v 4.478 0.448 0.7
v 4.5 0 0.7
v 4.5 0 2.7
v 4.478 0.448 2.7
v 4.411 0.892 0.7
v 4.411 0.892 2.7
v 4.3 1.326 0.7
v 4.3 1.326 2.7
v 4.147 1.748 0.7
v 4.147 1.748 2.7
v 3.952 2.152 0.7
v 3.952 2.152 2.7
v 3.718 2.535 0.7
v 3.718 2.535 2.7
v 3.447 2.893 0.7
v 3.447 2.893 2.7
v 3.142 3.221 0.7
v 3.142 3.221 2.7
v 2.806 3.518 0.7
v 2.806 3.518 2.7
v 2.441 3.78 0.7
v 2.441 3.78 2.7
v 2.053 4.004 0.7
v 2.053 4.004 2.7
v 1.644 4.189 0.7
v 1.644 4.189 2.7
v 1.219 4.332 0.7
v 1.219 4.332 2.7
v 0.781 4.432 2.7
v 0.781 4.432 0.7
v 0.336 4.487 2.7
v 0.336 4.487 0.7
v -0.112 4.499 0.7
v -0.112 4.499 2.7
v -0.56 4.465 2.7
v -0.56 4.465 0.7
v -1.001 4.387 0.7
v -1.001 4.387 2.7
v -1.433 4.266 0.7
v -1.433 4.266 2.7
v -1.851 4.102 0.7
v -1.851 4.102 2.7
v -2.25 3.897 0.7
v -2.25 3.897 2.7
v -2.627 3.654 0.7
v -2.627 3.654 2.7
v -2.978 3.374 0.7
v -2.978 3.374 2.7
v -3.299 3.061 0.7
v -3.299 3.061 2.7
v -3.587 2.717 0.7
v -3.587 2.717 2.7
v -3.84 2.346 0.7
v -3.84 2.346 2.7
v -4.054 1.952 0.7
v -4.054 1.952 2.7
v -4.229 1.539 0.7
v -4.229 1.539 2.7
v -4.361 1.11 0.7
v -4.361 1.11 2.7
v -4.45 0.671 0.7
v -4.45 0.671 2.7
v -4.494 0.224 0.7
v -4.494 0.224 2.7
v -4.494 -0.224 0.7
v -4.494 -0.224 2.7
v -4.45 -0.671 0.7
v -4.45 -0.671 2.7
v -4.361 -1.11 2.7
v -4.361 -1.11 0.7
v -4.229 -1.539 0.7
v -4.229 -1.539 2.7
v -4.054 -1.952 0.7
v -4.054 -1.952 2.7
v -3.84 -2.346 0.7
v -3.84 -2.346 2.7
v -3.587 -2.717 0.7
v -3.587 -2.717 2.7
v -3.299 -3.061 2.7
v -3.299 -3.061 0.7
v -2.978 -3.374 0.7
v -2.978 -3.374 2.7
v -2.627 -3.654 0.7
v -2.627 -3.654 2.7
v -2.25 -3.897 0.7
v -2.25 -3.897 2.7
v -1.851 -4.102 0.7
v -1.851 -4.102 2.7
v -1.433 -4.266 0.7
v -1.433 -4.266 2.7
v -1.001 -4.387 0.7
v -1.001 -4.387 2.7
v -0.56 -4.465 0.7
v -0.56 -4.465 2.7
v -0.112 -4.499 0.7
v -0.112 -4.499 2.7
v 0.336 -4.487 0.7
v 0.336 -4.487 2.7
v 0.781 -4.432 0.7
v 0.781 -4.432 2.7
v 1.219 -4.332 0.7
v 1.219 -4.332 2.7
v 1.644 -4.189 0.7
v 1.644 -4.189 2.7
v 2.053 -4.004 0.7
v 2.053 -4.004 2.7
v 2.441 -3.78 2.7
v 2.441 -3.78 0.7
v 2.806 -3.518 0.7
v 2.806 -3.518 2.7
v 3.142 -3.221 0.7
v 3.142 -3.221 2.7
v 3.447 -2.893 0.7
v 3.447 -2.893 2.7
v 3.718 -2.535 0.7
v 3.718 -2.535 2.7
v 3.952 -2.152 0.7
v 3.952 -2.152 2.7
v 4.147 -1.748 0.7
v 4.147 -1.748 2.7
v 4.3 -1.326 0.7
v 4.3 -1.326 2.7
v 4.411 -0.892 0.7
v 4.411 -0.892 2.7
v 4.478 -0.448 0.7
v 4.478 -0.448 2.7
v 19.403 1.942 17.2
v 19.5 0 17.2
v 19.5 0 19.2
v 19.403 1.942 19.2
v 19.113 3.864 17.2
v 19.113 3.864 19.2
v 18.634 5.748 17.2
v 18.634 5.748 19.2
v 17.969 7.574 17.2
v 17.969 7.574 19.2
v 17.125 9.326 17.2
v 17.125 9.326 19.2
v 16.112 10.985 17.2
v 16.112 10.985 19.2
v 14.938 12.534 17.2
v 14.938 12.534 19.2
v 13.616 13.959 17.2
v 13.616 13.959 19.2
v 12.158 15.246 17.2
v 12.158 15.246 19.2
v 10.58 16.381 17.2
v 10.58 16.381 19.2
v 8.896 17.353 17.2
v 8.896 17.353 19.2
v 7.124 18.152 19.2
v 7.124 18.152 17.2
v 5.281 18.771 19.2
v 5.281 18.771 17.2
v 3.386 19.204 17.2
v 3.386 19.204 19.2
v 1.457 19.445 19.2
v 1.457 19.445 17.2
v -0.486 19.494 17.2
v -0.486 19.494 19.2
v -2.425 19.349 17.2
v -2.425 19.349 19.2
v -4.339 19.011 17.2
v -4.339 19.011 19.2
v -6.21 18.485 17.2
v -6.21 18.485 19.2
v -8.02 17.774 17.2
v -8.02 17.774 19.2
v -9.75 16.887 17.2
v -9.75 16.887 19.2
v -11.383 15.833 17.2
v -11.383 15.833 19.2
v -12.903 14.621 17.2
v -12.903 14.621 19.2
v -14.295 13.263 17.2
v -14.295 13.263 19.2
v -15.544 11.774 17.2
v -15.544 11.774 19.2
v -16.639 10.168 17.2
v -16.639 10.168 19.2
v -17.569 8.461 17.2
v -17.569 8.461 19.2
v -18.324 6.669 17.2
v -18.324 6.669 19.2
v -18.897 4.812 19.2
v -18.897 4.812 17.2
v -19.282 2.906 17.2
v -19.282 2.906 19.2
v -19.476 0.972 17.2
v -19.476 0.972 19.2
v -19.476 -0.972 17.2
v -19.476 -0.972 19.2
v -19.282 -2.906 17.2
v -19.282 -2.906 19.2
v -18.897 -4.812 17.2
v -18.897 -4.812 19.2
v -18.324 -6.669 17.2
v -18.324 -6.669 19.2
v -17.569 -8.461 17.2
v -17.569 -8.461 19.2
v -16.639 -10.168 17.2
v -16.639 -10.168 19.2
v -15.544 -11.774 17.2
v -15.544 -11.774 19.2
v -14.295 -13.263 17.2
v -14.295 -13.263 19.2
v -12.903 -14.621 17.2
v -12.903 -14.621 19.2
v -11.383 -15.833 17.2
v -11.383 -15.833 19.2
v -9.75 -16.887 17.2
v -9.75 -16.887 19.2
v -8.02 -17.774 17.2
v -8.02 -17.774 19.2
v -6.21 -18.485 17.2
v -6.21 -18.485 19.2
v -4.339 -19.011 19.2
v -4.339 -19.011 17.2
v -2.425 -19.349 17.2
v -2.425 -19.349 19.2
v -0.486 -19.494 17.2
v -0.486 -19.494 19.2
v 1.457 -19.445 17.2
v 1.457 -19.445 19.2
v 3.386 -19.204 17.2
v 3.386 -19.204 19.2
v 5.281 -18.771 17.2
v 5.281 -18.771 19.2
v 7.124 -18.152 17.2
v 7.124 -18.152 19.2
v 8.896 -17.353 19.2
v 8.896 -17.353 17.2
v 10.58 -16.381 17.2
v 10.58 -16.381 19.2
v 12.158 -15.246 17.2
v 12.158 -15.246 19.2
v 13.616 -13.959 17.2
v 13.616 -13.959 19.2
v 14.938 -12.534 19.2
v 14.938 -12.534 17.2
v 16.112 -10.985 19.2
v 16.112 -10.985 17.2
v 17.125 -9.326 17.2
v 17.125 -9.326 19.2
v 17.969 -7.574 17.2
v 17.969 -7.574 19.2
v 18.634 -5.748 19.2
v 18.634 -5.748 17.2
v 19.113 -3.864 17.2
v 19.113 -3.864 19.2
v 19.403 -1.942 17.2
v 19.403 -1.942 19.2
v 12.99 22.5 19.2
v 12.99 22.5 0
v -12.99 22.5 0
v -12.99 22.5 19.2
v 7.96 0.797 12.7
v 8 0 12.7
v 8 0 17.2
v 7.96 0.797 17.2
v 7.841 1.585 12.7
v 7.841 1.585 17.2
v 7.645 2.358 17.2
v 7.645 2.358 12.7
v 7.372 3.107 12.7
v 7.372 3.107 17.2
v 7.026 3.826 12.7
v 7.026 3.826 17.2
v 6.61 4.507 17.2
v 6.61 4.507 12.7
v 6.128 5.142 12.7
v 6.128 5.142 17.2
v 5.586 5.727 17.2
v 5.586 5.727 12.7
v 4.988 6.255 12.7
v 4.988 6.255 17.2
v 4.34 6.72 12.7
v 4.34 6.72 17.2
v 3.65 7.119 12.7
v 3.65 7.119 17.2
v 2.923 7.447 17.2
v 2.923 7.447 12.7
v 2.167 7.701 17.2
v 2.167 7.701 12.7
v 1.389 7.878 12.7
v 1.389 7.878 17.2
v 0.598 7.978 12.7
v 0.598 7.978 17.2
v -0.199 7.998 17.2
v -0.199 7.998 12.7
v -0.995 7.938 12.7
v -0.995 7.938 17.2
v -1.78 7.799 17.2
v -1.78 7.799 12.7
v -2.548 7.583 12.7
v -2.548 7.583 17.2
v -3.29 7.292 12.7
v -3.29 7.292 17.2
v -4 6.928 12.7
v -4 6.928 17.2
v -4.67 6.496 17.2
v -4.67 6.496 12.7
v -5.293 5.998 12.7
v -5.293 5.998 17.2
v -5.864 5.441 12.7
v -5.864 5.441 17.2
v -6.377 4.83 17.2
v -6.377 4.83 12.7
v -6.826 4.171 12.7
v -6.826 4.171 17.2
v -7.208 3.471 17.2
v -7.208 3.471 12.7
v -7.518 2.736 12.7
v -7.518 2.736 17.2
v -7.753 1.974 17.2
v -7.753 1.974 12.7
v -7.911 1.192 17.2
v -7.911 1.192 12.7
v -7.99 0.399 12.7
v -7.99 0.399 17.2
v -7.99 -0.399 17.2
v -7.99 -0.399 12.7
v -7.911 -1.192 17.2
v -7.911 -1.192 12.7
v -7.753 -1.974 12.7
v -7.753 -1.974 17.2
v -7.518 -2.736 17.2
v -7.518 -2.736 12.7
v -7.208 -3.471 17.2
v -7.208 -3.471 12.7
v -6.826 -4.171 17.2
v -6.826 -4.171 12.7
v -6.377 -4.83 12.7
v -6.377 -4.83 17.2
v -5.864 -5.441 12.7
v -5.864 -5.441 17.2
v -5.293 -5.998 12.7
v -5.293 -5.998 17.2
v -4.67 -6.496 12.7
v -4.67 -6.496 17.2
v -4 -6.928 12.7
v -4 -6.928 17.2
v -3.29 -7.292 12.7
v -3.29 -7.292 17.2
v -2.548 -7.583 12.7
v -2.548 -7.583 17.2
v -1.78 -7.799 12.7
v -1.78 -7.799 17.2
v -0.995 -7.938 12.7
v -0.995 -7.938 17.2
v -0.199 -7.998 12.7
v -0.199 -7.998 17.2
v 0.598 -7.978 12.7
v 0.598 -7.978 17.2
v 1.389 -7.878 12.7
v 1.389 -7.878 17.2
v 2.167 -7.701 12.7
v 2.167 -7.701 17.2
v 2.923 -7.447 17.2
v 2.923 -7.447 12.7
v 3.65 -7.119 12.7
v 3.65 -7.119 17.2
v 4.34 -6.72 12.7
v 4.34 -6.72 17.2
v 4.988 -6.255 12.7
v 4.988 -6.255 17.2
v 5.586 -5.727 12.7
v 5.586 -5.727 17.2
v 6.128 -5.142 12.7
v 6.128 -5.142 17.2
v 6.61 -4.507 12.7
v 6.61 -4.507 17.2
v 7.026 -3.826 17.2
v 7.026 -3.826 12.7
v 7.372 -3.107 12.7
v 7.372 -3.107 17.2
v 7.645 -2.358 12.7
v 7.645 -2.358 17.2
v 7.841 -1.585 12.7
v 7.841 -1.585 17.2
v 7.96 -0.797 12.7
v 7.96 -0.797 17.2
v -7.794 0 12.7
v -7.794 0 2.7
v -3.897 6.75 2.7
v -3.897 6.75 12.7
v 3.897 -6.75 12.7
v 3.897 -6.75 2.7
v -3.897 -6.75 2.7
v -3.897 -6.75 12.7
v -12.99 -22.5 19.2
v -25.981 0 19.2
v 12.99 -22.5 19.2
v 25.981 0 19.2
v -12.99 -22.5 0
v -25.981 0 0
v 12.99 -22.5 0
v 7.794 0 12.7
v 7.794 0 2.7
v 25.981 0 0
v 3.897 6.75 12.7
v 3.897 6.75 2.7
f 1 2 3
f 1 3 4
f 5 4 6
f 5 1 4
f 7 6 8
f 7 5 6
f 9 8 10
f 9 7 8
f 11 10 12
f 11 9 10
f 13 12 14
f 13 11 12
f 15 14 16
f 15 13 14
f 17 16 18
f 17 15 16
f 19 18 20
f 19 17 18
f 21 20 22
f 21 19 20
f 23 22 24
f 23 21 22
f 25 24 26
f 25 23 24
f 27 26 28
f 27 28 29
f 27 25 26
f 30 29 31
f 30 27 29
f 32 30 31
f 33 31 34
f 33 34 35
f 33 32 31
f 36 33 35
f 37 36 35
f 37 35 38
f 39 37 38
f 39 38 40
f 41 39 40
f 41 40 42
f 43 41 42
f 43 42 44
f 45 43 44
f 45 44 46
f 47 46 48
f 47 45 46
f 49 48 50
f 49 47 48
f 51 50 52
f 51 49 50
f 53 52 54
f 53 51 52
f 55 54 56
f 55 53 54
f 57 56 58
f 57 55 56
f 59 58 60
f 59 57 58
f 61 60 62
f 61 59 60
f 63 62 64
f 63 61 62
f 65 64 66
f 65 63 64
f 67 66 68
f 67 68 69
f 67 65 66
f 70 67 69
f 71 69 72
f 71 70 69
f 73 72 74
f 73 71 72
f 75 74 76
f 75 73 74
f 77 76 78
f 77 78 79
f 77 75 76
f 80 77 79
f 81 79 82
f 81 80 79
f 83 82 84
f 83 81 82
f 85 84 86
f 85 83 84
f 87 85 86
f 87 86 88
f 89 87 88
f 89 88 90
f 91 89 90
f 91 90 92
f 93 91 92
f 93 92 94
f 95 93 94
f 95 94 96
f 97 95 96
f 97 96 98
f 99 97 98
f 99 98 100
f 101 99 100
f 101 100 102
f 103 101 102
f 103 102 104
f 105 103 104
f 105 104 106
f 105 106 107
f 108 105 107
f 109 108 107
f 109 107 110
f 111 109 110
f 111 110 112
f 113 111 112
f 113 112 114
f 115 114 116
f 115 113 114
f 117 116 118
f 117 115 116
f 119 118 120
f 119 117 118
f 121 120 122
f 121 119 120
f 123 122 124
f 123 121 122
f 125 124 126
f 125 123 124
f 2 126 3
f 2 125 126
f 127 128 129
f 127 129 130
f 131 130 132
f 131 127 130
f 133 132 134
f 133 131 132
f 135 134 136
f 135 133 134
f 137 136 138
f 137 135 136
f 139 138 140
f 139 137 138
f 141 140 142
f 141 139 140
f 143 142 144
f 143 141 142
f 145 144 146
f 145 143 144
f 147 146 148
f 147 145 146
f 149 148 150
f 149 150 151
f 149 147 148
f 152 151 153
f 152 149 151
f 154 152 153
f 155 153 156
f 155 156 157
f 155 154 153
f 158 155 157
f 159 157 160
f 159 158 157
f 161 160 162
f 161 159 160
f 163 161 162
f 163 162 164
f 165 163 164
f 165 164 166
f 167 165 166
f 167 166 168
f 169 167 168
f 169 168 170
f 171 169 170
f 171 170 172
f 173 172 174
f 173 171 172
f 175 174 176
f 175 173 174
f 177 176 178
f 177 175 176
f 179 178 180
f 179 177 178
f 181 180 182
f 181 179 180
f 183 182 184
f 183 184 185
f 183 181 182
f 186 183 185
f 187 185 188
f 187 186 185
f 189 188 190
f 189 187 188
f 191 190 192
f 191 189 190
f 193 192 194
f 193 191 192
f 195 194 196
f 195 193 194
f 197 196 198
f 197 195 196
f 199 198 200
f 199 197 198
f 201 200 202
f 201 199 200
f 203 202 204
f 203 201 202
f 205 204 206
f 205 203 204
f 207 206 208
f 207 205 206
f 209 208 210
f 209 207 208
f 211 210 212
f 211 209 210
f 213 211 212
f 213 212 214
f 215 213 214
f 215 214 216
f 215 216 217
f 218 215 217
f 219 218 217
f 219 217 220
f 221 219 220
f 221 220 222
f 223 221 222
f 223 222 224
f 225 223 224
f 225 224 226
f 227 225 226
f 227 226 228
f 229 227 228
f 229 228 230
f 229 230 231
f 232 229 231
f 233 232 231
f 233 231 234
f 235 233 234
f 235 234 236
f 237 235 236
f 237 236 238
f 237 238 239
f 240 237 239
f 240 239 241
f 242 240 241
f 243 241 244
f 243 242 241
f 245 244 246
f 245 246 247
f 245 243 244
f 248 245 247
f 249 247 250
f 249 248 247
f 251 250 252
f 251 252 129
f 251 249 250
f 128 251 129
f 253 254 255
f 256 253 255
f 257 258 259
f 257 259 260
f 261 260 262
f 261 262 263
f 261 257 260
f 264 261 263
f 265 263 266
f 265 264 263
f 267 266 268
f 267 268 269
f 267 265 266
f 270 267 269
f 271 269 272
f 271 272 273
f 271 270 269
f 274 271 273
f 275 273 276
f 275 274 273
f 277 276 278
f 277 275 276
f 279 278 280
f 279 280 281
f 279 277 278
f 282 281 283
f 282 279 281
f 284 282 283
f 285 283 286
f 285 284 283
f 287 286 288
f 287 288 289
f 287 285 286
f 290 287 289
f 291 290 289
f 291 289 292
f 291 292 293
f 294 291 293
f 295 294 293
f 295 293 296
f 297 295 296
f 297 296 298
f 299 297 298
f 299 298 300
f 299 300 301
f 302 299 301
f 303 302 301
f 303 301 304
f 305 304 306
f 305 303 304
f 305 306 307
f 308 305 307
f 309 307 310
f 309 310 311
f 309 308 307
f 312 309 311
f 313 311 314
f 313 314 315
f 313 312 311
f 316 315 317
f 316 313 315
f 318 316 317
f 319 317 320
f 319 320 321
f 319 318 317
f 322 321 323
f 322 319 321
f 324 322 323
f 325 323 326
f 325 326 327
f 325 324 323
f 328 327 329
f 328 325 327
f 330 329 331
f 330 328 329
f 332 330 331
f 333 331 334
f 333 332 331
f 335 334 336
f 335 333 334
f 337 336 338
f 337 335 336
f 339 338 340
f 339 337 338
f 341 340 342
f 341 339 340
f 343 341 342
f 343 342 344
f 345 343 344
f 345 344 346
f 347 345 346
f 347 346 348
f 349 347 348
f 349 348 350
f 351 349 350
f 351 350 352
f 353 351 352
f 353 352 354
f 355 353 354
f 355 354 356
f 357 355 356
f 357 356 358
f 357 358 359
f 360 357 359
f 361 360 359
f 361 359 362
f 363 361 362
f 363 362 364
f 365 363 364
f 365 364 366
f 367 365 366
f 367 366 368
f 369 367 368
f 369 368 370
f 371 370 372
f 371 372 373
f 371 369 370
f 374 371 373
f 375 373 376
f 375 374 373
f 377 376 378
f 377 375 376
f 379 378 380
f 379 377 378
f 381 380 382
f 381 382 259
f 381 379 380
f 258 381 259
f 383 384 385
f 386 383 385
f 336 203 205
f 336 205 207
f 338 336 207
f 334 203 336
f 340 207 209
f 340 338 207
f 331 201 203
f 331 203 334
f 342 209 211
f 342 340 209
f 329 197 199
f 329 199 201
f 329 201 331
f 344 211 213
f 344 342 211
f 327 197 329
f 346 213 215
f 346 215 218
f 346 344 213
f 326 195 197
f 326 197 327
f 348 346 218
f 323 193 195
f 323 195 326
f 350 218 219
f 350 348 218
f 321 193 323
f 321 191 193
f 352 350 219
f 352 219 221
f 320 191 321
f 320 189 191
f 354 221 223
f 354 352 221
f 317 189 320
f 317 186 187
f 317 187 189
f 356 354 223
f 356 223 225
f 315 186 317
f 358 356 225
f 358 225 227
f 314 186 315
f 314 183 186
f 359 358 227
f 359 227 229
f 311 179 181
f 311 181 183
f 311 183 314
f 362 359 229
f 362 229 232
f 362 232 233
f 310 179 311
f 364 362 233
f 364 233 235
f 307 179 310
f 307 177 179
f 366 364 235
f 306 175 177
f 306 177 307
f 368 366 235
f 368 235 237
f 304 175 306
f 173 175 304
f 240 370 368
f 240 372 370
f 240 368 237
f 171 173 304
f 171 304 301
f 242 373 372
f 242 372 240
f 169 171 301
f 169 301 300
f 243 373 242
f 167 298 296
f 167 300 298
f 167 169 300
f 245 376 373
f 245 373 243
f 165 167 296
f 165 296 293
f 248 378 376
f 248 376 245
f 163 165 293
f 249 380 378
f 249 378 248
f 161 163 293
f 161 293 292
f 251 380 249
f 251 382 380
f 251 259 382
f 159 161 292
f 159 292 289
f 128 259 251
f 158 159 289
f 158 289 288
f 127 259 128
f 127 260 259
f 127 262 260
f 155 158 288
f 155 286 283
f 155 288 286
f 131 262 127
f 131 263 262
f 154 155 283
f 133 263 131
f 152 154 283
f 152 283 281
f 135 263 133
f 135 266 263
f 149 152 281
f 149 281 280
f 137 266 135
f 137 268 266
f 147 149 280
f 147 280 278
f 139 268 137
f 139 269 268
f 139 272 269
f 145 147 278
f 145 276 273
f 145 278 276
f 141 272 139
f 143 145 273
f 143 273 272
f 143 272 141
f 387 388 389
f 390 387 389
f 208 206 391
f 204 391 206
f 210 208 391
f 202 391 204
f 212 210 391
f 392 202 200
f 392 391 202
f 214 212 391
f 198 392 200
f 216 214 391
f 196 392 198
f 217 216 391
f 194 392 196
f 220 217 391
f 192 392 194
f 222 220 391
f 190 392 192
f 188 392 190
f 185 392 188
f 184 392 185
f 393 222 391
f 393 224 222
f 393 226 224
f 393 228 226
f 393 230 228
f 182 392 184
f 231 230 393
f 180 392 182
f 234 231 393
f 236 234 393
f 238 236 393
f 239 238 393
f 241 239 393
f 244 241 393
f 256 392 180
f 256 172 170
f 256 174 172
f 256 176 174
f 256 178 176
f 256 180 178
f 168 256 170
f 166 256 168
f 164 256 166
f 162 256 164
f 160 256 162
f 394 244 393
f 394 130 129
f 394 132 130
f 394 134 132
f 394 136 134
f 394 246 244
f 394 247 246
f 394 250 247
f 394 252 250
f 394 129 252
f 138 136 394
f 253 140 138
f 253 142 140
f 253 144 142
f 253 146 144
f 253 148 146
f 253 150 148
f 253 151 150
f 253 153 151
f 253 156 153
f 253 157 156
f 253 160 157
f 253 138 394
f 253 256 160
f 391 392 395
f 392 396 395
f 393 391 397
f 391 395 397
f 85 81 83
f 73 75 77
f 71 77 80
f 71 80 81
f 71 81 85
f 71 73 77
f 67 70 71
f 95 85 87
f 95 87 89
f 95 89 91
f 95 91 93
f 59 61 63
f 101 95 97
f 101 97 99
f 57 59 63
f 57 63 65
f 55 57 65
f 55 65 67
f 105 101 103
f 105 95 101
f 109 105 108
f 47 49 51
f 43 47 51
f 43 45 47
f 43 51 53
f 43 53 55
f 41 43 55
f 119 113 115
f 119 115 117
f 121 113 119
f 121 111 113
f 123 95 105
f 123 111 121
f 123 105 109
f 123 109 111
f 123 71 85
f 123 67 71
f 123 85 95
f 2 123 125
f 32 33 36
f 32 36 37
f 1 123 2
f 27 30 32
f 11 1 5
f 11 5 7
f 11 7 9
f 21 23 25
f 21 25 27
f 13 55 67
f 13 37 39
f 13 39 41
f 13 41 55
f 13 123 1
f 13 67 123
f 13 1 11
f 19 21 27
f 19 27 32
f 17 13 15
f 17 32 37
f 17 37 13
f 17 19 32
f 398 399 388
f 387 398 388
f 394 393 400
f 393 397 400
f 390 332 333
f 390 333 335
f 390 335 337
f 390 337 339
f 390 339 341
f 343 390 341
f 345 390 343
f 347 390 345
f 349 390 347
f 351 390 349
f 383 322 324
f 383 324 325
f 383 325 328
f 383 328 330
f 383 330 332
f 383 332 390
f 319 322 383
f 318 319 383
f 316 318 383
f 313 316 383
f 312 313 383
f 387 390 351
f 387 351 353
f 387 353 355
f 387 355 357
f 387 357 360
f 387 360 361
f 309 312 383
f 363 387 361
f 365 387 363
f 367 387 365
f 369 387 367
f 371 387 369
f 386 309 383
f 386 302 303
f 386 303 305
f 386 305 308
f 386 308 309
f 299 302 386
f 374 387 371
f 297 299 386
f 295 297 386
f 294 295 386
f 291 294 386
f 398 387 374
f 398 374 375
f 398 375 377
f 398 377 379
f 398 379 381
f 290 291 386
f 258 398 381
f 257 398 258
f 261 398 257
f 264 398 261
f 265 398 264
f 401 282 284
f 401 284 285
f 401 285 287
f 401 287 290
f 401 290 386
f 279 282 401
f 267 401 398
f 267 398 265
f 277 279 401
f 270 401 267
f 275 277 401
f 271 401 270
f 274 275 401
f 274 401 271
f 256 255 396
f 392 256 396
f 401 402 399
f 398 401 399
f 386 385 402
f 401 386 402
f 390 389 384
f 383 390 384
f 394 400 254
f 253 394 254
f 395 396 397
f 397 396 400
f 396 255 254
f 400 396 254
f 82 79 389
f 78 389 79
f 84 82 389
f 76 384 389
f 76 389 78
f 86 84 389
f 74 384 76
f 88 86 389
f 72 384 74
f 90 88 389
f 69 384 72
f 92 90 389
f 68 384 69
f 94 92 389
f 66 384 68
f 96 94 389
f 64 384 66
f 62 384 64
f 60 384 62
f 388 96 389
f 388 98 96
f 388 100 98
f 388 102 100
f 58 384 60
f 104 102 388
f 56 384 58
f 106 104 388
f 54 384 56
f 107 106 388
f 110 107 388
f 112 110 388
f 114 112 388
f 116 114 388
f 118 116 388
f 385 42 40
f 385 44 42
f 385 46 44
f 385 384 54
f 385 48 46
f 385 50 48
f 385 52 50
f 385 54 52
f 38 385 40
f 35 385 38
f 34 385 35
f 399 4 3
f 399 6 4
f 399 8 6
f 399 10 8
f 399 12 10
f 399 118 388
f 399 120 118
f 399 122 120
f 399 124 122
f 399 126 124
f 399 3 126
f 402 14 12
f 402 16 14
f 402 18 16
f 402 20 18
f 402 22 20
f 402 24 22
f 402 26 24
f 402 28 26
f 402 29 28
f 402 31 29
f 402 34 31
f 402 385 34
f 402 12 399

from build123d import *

# Parameters (mm, degrees)
F1_DEPTH = 0.7
F2_R     = 4.5
F3_DEPTH = 2
F5_DEPTH = 10
F6_R     = 8
F7_DEPTH = 4.5
F8_R     = 19.5
F9_DEPTH = 2


with BuildPart() as f1:
    # F0 (on Top) → F1 (new body)
    with BuildSketch(Plane.XY):
        Polygon((-12.9903810568, -22.5), (12.9903810568, -22.5), (25.9807621135, 0), (12.9903810568, 22.5), (-12.9903810568, 22.5), (-25.9807621135, 0), align=None)
    extrude(amount=F1_DEPTH)

    # F2 (on face) → F3 (join)
    with BuildSketch(Plane.XY.offset(0.7)):
        Polygon((-12.9903810568, 22.5), (-25.9807621135, 0), (-12.9903810568, -22.5), (12.9903810568, -22.5), (25.9807621135, 0), (12.9903810568, 22.5), align=None)
        Circle(F2_R, mode=Mode.SUBTRACT)
    extrude(amount=F3_DEPTH)

    # F4 (on face) → F5 (join)
    with BuildSketch(Plane.XY.offset(2.7)):
        Polygon((12.9903810568, -22.5), (25.9807621135, 0), (12.9903810568, 22.5), (-12.9903810568, 22.5), (-25.9807621135, 0), (-12.9903810568, -22.5), align=None)
        Polygon((7.7942286341, 0), (3.897114317, -6.75), (-3.897114317, -6.75), (-7.7942286341, 0), (-3.897114317, 6.75), (3.897114317, 6.75), align=None, mode=Mode.SUBTRACT)
    extrude(amount=F5_DEPTH)

    # F6 (on face) → F7 (join)
    with BuildSketch(Plane.XY.offset(12.7)):
        Polygon((-12.9903810568, -22.5), (12.9903810568, -22.5), (25.9807621135, 0), (12.9903810568, 22.5), (-12.9903810568, 22.5), (-25.9807621135, 0), align=None)
        Circle(F6_R, mode=Mode.SUBTRACT)
    extrude(amount=F7_DEPTH)

    # F8 (on face) → F9 (join)
    with BuildSketch(Plane.XY.offset(17.2)):
        Polygon((-12.9903810568, 22.5), (-25.9807621135, 0), (-12.9903810568, -22.5), (12.9903810568, -22.5), (25.9807621135, 0), (12.9903810568, 22.5), align=None)
        Circle(F8_R, mode=Mode.SUBTRACT)
    extrude(amount=F9_DEPTH)


solid = f1.part
